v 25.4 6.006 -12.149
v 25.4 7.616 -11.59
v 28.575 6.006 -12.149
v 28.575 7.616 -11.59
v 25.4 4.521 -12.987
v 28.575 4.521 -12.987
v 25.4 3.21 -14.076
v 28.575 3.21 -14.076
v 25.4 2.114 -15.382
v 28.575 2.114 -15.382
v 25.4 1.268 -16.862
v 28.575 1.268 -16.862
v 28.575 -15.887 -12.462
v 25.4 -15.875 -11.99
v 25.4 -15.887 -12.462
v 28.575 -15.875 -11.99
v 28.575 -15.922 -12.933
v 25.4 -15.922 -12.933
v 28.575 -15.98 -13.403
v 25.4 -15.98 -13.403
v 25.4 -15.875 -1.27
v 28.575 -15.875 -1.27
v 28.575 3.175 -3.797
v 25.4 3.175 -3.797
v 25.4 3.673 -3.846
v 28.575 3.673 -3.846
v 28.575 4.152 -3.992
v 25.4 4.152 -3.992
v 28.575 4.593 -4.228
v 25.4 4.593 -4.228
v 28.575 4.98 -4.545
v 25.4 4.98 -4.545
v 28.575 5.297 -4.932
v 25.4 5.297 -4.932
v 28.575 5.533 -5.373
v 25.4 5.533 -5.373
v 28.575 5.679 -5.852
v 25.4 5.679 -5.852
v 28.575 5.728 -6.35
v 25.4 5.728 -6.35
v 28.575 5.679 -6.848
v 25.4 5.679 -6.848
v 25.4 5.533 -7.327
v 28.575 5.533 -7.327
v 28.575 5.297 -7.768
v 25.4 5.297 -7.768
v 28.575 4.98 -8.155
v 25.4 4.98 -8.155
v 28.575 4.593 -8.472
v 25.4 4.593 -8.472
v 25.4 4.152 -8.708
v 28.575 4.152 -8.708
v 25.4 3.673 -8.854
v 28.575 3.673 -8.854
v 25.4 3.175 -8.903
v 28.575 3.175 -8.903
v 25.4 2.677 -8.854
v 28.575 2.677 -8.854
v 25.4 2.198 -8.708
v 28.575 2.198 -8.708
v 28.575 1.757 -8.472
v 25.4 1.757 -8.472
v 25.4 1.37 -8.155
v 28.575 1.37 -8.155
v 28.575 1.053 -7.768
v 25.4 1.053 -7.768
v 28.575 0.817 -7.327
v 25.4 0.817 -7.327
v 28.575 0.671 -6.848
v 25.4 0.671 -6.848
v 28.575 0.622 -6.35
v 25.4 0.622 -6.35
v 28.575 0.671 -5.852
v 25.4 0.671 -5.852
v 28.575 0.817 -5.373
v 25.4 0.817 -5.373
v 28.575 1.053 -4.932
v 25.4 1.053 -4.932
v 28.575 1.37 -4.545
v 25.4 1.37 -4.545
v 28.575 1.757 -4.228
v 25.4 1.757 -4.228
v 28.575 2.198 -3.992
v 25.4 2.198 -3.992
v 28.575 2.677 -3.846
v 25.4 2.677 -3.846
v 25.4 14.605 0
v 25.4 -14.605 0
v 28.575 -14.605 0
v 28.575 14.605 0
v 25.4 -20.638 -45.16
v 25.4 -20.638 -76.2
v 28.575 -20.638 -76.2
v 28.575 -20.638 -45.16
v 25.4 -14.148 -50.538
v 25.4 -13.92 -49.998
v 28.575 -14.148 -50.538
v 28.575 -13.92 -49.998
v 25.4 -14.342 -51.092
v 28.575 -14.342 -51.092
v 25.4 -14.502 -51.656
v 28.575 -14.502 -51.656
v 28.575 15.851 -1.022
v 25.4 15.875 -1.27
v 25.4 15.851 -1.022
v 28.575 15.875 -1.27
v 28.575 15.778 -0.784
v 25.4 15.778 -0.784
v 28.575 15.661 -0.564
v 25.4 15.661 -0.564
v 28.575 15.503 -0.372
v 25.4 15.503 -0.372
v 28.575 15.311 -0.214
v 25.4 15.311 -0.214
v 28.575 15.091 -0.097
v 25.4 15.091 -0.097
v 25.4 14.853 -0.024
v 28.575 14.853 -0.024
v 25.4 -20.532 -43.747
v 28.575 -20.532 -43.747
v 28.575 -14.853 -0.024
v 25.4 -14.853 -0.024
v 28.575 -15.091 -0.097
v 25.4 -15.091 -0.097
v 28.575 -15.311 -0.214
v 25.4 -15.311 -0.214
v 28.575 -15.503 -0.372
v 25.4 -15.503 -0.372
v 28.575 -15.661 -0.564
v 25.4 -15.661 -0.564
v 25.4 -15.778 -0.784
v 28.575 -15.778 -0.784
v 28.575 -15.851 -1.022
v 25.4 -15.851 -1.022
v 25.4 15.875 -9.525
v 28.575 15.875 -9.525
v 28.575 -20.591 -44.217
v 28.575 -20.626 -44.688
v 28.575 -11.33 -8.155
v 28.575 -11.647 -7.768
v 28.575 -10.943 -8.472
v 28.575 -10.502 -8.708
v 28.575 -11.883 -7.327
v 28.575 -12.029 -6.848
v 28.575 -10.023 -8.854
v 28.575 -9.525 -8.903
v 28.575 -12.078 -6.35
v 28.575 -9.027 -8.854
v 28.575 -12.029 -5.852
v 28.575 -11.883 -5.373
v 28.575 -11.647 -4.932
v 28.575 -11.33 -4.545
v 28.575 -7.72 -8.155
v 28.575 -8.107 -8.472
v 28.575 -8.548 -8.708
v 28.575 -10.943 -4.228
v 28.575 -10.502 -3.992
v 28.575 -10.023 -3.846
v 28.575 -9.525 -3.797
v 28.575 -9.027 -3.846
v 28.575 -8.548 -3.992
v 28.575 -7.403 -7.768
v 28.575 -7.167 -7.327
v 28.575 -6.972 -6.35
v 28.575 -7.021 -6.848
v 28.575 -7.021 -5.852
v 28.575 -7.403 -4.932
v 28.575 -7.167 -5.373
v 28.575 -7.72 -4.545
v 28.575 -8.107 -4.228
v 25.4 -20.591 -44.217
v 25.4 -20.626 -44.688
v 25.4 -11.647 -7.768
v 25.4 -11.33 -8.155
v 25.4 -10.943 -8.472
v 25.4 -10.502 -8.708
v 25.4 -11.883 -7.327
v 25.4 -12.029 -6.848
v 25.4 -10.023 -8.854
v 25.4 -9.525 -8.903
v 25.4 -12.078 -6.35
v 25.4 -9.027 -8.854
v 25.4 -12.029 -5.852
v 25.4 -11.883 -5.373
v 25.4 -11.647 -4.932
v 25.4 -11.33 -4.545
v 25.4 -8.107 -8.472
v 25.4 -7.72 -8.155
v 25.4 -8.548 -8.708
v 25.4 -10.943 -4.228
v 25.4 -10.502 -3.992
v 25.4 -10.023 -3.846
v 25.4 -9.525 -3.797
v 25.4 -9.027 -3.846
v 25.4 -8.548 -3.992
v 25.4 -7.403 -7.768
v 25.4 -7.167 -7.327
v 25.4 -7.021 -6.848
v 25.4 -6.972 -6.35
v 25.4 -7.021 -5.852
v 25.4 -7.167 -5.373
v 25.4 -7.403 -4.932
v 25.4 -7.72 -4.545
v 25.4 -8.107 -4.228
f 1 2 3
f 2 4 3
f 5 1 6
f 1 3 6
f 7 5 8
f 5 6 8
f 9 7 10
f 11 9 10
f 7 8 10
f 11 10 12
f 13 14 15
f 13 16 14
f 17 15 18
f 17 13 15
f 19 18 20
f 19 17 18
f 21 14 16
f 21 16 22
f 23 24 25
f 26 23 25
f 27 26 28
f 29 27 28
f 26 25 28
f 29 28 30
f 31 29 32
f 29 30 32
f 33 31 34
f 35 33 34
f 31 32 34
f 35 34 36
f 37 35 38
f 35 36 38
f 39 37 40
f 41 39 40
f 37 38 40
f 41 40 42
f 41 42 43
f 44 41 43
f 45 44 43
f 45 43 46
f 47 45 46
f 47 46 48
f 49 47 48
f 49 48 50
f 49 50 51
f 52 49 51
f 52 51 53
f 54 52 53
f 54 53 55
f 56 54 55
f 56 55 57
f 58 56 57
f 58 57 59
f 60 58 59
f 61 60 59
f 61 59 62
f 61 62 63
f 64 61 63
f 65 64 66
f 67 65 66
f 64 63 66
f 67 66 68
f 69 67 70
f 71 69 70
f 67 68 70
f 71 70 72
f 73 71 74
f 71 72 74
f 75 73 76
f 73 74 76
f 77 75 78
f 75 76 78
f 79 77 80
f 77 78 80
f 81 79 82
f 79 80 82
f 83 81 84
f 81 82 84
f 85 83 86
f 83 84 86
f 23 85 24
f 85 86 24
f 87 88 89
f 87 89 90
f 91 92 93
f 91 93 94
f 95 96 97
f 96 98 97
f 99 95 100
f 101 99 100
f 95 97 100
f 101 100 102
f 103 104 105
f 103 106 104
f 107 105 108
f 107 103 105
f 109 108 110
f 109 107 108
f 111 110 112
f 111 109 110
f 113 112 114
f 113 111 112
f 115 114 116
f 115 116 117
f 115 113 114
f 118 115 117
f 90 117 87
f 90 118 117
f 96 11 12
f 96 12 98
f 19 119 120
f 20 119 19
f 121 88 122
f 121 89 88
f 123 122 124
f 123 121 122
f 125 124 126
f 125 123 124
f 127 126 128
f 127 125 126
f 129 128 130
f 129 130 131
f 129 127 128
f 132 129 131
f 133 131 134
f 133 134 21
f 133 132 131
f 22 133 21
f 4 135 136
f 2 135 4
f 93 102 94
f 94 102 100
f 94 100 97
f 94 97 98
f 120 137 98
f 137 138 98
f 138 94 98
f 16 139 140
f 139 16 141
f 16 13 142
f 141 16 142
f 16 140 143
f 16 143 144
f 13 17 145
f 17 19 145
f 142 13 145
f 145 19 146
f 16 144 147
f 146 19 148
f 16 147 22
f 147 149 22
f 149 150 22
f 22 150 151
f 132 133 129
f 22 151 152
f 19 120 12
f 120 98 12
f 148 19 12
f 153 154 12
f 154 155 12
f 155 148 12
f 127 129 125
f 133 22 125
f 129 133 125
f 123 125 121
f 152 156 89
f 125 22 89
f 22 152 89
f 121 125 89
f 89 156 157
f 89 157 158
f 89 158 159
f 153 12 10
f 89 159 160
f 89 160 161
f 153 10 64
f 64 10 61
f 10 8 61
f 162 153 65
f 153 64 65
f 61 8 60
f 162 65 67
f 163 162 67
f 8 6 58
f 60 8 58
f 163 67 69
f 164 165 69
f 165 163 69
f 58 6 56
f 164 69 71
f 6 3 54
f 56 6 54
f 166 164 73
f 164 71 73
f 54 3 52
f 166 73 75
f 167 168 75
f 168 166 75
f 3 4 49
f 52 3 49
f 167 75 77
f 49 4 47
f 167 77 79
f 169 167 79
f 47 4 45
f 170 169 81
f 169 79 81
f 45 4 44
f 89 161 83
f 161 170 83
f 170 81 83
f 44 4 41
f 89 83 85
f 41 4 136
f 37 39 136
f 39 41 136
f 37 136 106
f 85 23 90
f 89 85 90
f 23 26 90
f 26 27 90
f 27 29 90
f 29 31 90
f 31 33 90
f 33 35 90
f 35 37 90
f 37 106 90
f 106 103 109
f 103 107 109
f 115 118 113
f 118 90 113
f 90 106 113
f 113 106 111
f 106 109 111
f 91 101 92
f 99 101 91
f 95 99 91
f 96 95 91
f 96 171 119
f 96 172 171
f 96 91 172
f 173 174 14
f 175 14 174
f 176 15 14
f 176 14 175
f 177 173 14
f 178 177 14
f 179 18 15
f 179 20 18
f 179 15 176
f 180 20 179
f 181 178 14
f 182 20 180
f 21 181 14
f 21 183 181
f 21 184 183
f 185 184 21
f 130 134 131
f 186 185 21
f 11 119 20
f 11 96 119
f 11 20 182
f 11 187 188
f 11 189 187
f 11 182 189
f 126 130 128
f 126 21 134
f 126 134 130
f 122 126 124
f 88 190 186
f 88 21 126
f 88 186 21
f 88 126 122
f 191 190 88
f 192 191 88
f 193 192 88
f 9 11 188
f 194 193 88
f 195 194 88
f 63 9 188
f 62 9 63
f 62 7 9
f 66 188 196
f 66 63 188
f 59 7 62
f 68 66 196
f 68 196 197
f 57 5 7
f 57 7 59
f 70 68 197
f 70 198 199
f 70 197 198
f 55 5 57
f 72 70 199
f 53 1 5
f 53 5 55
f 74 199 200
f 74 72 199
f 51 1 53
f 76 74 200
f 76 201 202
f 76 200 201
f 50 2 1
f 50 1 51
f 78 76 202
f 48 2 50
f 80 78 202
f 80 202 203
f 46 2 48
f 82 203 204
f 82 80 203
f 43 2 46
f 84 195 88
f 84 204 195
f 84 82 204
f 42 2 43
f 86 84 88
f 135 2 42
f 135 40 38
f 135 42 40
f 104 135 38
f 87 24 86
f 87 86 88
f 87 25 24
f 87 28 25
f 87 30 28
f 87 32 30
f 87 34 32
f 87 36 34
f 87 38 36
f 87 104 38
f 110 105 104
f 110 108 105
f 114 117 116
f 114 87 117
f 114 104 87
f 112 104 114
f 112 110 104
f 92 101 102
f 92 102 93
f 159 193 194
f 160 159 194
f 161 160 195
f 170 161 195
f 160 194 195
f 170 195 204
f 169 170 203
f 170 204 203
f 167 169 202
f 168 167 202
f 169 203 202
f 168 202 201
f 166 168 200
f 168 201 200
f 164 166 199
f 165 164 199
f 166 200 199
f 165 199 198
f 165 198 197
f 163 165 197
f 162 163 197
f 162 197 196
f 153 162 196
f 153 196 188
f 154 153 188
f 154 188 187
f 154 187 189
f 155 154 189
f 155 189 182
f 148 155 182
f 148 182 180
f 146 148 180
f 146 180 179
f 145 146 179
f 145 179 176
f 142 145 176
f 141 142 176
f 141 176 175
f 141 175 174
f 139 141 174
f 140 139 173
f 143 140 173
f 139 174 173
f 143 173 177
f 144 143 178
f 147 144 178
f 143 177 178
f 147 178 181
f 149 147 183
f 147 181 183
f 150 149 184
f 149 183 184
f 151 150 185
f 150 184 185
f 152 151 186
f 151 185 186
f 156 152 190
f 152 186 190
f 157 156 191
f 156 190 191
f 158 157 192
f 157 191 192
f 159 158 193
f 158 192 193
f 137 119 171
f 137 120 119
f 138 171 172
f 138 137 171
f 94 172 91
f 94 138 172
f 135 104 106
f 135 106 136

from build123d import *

# Parameters (mm, degrees)
SKETCH3_W                = 114.3
SKETCH3_H                = 88.9
SKETCH3_W_2              = 95.25
SKETCH3_H_2              = 76.2
BOSS_EXTRUDE1_DEPTH      = 12.7
BOSS_EXTRUDE1_DEPTH_BACK = 12.7
SKETCH4_W                = 114.3
SKETCH4_H                = 88.9
BOSS_EXTRUDE2_DEPTH      = 3.175
SKETCH5_W                = 114.3
SKETCH5_H                = 88.9
BOSS_EXTRUDE3_DEPTH      = 3.175
SKETCH7_W                = 41.275
SKETCH7_H                = 25.4
BOSS_EXTRUDE4_DEPTH      = 6.35
SKETCH6_R                = 9.9695
CUT_EXTRUDE1_DEPTH       = 115.3
SKETCH13_W               = 26.035
SKETCH13_H               = 25.4
BOSS_EXTRUDE5_DEPTH      = 4.064
SKETCH19_R               = 0.9525
CUT_EXTRUDE4_DEPTH       = 25.4
SKETCH20_R               = 1.905
CUT_EXTRUDE7_DEPTH       = 3.175
SKETCH23_R               = 5.08
SKETCH23_R_2             = 1.905
SKETCH23_R_3             = 2.38125
CUT_EXTRUDE8_DEPTH       = 3.175
BOSS_EXTRUDE6_DEPTH      = 25.4
BOSS_EXTRUDE7_DEPTH      = 3.175
SKETCH27_R               = 4.7625
CUT_EXTRUDE9_DEPTH       = 32.75
CUT_EXTRUDE9_DEPTH_BACK  = 83.55
SKETCH28_R               = 2.5527
CUT_EXTRUDE10_DEPTH      = 32.75
FILLET1_R                = 9.525
FILLET2_R                = 1.27
CUT_EXTRUDE11_START      = -31.75
SKETCH29_W               = 6.35
SKETCH29_H               = 5.08
CUT_EXTRUDE11_DEPTH      = 38.1


with BuildPart() as part:
    # Sketch3 → Boss-Extrude1 (new body, two sides)
    with BuildSketch(Plane(origin=(0, 0, 0), x_dir=(1, 0, 0), z_dir=(0, 1, 0))) as boss_extrude1_sk:
        with Locations((0, -44.45)):
            Rectangle(SKETCH3_W, SKETCH3_H)
        with Locations((0, -44.45)):
            Rectangle(SKETCH3_W_2, SKETCH3_H_2, mode=Mode.SUBTRACT)
    extrude(amount=BOSS_EXTRUDE1_DEPTH)
    extrude(boss_extrude1_sk.sketch, amount=-BOSS_EXTRUDE1_DEPTH_BACK)

    # Sketch4 → Boss-Extrude2 (add)
    with BuildSketch(Plane.XZ.offset(12.7)):
        with Locations((0, 44.45)):
            Rectangle(SKETCH4_W, SKETCH4_H)
    extrude(amount=BOSS_EXTRUDE2_DEPTH)

    # Sketch7 → Boss-Extrude4 (add)
    with BuildSketch(Plane(origin=(0, -12.7, 0), x_dir=(1, 0, 0), z_dir=(0, 1, 0))):
        with Locations((-26.9875, -50.8)):
            Rectangle(SKETCH7_W, SKETCH7_H)
        with Locations((26.9875, -50.8)):
            Rectangle(SKETCH7_W, SKETCH7_H)
    extrude(amount=BOSS_EXTRUDE4_DEPTH)

    # Sketch6 → Cut-Extrude1 (cut, through all)
    with BuildSketch(Plane.ZY.offset(57.15)):
        with Locations((50.8, 0)):
            Circle(SKETCH6_R)
    extrude(amount=-CUT_EXTRUDE1_DEPTH, mode=Mode.SUBTRACT)

    # Sketch13 → Boss-Extrude5 (add)
    with BuildSketch(Plane(origin=(0, -12.7, 0), x_dir=(1, 0, 0), z_dir=(0, 1, 0))):
        with Locations((-19.3675, -50.8)):
            Rectangle(SKETCH13_W, SKETCH13_H)
        with Locations((19.3675, -50.8)):
            Rectangle(SKETCH13_W, SKETCH13_H)
    extrude(amount=BOSS_EXTRUDE5_DEPTH)

    # Sketch19 → Cut-Extrude4 (cut)
    with BuildSketch(Plane(origin=(0, 12.7, 0), x_dir=(1, 0, 0), z_dir=(0, 1, 0))):
        with Locations((-53.975, -3.175)):
            Circle(SKETCH19_R)
        with Locations((53.975, -3.175)):
            Circle(SKETCH19_R)
        with Locations((-53.975, -85.725)):
            Circle(SKETCH19_R)
        with Locations((53.975, -85.725)):
            Circle(SKETCH19_R)
    extrude(amount=-CUT_EXTRUDE4_DEPTH, mode=Mode.SUBTRACT)

    # Sketch25 → Boss-Extrude6 (add, symmetric)
    with BuildSketch(Plane(origin=(0, 0, 0), x_dir=(0, 0, -1), z_dir=(1, 0, 0))):
        Polygon((0, -15.875), (0, 15.875), (9.525, 15.875), (12.7, 3.175), (12.7, -15.875), align=None)
    extrude(amount=BOSS_EXTRUDE6_DEPTH, both=True)

    # Sketch27 → Cut-Extrude9 (cut, two sides)
    with BuildSketch(Plane(origin=(25.4, 0, 0), x_dir=(0, 0, -1), z_dir=(1, 0, 0))) as cut_extrude9_sk:
        with Locations((6.35, -9.525)):
            Circle(SKETCH27_R)
        with Locations((6.35, 3.175)):
            Circle(SKETCH27_R)
    extrude(amount=CUT_EXTRUDE9_DEPTH, mode=Mode.SUBTRACT)
    extrude(cut_extrude9_sk.sketch, amount=-CUT_EXTRUDE9_DEPTH_BACK, mode=Mode.SUBTRACT)

    # Sketch29 → Cut-Extrude11 (cut)
    with BuildSketch(Plane(origin=(0, 0, 38.1), x_dir=(-1, 0, 0), z_dir=(0, 0, -1)).offset(CUT_EXTRUDE11_START)):
        with Locations((-26.3525, -12.7)):
            Rectangle(SKETCH29_W, SKETCH29_H)
        with Locations((-12.3825, -12.7)):
            Rectangle(SKETCH29_W, SKETCH29_H)
    cut_extrude11 = extrude(amount=CUT_EXTRUDE11_DEPTH, mode=Mode.SUBTRACT)

    # Mirror2: Cut-Extrude11 across plane
    add(cut_extrude11.mirror(Plane(origin=(0, 0, 0), x_dir=(0, 0, 1), z_dir=(1, 0, 0))), mode=Mode.SUBTRACT)


with BuildPart() as body_2:
    # Sketch5 → Boss-Extrude3 (new body)
    with BuildSketch(Plane(origin=(0, 12.7, 0), x_dir=(1, 0, 0), z_dir=(0, 1, 0))):
        with Locations((0, -44.45)):
            Rectangle(SKETCH5_W, SKETCH5_H)
    extrude(amount=BOSS_EXTRUDE3_DEPTH)

    # Sketch20 → Cut-Extrude7 (cut)
    with BuildSketch(Plane(origin=(0, 15.875, 0), x_dir=(1, 0, 0), z_dir=(0, 1, 0))):
        with Locations((-53.975, -3.175)):
            Circle(SKETCH20_R)
        with Locations((-53.975, -85.725)):
            Circle(SKETCH20_R)
        with Locations((53.975, -85.725)):
            Circle(SKETCH20_R)
        with Locations((53.975, -3.175)):
            Circle(SKETCH20_R)
    extrude(amount=-CUT_EXTRUDE7_DEPTH, mode=Mode.SUBTRACT)

    # Sketch23 → Cut-Extrude8 (cut)
    with BuildSketch(Plane(origin=(0, 15.875, 0), x_dir=(1, 0, 0), z_dir=(0, 1, 0))):
        with Locations((36.232509154, -69.504266718)):
            Circle(SKETCH23_R)
        with Locations((44.45, -62.808533435)):
            Circle(SKETCH23_R_2)
        with Locations((28.015018307, -76.2)):
            Circle(SKETCH23_R_2)
        with Locations((2.615018307, -60.427283435)):
            Circle(SKETCH23_R_3)
    extrude(amount=-CUT_EXTRUDE8_DEPTH, mode=Mode.SUBTRACT)


with BuildPart() as body_3:
    # Sketch26 → Boss-Extrude7 (new body)
    with BuildSketch(Plane(origin=(25.4, 0, 0), x_dir=(0, 0, -1), z_dir=(1, 0, 0))):
        Polygon((0, 15.875), (9.525, 15.875), (12.7, 3.175), (50.8, -14.2875), (76.2, -20.6375), (44.45, -20.6375), (12.7, -15.875), (0, -15.875), align=None)
    extrude(amount=BOSS_EXTRUDE7_DEPTH)

    # Sketch28 → Cut-Extrude10 (cut, through all)
    with BuildSketch(Plane.ZY.offset(-25.4)):
        with Locations((-6.35, 3.175)):
            Circle(SKETCH28_R)
        with Locations((-6.35, -9.525)):
            Circle(SKETCH28_R)
    extrude(amount=-CUT_EXTRUDE10_DEPTH, mode=Mode.SUBTRACT)

    # Fillet1
    fillet1_edges = [body_3.edges().sort_by_distance(p)[0] for p in [
        (26.9875, 3.175, -12.7),
        (26.9875, -14.2875, -50.8),
        (26.9875, -20.6375, -44.45),
        (26.9875, -15.875, -12.7),
    ]]
    fillet(fillet1_edges, radius=FILLET1_R)

    # Fillet2
    fillet2_edges = [body_3.edges().sort_by_distance(p)[0] for p in [
        (26.9875, 15.875, 0),
        (26.9875, -15.875, 0),
    ]]
    fillet(fillet2_edges, radius=FILLET2_R)


with BuildPart() as body_4:
    # Mirror1: mirrored copy
    add(body_3.part.mirror(Plane(origin=(0, 0, 0), x_dir=(0, 0, 1), z_dir=(1, 0, 0))))


solid = body_3.part
